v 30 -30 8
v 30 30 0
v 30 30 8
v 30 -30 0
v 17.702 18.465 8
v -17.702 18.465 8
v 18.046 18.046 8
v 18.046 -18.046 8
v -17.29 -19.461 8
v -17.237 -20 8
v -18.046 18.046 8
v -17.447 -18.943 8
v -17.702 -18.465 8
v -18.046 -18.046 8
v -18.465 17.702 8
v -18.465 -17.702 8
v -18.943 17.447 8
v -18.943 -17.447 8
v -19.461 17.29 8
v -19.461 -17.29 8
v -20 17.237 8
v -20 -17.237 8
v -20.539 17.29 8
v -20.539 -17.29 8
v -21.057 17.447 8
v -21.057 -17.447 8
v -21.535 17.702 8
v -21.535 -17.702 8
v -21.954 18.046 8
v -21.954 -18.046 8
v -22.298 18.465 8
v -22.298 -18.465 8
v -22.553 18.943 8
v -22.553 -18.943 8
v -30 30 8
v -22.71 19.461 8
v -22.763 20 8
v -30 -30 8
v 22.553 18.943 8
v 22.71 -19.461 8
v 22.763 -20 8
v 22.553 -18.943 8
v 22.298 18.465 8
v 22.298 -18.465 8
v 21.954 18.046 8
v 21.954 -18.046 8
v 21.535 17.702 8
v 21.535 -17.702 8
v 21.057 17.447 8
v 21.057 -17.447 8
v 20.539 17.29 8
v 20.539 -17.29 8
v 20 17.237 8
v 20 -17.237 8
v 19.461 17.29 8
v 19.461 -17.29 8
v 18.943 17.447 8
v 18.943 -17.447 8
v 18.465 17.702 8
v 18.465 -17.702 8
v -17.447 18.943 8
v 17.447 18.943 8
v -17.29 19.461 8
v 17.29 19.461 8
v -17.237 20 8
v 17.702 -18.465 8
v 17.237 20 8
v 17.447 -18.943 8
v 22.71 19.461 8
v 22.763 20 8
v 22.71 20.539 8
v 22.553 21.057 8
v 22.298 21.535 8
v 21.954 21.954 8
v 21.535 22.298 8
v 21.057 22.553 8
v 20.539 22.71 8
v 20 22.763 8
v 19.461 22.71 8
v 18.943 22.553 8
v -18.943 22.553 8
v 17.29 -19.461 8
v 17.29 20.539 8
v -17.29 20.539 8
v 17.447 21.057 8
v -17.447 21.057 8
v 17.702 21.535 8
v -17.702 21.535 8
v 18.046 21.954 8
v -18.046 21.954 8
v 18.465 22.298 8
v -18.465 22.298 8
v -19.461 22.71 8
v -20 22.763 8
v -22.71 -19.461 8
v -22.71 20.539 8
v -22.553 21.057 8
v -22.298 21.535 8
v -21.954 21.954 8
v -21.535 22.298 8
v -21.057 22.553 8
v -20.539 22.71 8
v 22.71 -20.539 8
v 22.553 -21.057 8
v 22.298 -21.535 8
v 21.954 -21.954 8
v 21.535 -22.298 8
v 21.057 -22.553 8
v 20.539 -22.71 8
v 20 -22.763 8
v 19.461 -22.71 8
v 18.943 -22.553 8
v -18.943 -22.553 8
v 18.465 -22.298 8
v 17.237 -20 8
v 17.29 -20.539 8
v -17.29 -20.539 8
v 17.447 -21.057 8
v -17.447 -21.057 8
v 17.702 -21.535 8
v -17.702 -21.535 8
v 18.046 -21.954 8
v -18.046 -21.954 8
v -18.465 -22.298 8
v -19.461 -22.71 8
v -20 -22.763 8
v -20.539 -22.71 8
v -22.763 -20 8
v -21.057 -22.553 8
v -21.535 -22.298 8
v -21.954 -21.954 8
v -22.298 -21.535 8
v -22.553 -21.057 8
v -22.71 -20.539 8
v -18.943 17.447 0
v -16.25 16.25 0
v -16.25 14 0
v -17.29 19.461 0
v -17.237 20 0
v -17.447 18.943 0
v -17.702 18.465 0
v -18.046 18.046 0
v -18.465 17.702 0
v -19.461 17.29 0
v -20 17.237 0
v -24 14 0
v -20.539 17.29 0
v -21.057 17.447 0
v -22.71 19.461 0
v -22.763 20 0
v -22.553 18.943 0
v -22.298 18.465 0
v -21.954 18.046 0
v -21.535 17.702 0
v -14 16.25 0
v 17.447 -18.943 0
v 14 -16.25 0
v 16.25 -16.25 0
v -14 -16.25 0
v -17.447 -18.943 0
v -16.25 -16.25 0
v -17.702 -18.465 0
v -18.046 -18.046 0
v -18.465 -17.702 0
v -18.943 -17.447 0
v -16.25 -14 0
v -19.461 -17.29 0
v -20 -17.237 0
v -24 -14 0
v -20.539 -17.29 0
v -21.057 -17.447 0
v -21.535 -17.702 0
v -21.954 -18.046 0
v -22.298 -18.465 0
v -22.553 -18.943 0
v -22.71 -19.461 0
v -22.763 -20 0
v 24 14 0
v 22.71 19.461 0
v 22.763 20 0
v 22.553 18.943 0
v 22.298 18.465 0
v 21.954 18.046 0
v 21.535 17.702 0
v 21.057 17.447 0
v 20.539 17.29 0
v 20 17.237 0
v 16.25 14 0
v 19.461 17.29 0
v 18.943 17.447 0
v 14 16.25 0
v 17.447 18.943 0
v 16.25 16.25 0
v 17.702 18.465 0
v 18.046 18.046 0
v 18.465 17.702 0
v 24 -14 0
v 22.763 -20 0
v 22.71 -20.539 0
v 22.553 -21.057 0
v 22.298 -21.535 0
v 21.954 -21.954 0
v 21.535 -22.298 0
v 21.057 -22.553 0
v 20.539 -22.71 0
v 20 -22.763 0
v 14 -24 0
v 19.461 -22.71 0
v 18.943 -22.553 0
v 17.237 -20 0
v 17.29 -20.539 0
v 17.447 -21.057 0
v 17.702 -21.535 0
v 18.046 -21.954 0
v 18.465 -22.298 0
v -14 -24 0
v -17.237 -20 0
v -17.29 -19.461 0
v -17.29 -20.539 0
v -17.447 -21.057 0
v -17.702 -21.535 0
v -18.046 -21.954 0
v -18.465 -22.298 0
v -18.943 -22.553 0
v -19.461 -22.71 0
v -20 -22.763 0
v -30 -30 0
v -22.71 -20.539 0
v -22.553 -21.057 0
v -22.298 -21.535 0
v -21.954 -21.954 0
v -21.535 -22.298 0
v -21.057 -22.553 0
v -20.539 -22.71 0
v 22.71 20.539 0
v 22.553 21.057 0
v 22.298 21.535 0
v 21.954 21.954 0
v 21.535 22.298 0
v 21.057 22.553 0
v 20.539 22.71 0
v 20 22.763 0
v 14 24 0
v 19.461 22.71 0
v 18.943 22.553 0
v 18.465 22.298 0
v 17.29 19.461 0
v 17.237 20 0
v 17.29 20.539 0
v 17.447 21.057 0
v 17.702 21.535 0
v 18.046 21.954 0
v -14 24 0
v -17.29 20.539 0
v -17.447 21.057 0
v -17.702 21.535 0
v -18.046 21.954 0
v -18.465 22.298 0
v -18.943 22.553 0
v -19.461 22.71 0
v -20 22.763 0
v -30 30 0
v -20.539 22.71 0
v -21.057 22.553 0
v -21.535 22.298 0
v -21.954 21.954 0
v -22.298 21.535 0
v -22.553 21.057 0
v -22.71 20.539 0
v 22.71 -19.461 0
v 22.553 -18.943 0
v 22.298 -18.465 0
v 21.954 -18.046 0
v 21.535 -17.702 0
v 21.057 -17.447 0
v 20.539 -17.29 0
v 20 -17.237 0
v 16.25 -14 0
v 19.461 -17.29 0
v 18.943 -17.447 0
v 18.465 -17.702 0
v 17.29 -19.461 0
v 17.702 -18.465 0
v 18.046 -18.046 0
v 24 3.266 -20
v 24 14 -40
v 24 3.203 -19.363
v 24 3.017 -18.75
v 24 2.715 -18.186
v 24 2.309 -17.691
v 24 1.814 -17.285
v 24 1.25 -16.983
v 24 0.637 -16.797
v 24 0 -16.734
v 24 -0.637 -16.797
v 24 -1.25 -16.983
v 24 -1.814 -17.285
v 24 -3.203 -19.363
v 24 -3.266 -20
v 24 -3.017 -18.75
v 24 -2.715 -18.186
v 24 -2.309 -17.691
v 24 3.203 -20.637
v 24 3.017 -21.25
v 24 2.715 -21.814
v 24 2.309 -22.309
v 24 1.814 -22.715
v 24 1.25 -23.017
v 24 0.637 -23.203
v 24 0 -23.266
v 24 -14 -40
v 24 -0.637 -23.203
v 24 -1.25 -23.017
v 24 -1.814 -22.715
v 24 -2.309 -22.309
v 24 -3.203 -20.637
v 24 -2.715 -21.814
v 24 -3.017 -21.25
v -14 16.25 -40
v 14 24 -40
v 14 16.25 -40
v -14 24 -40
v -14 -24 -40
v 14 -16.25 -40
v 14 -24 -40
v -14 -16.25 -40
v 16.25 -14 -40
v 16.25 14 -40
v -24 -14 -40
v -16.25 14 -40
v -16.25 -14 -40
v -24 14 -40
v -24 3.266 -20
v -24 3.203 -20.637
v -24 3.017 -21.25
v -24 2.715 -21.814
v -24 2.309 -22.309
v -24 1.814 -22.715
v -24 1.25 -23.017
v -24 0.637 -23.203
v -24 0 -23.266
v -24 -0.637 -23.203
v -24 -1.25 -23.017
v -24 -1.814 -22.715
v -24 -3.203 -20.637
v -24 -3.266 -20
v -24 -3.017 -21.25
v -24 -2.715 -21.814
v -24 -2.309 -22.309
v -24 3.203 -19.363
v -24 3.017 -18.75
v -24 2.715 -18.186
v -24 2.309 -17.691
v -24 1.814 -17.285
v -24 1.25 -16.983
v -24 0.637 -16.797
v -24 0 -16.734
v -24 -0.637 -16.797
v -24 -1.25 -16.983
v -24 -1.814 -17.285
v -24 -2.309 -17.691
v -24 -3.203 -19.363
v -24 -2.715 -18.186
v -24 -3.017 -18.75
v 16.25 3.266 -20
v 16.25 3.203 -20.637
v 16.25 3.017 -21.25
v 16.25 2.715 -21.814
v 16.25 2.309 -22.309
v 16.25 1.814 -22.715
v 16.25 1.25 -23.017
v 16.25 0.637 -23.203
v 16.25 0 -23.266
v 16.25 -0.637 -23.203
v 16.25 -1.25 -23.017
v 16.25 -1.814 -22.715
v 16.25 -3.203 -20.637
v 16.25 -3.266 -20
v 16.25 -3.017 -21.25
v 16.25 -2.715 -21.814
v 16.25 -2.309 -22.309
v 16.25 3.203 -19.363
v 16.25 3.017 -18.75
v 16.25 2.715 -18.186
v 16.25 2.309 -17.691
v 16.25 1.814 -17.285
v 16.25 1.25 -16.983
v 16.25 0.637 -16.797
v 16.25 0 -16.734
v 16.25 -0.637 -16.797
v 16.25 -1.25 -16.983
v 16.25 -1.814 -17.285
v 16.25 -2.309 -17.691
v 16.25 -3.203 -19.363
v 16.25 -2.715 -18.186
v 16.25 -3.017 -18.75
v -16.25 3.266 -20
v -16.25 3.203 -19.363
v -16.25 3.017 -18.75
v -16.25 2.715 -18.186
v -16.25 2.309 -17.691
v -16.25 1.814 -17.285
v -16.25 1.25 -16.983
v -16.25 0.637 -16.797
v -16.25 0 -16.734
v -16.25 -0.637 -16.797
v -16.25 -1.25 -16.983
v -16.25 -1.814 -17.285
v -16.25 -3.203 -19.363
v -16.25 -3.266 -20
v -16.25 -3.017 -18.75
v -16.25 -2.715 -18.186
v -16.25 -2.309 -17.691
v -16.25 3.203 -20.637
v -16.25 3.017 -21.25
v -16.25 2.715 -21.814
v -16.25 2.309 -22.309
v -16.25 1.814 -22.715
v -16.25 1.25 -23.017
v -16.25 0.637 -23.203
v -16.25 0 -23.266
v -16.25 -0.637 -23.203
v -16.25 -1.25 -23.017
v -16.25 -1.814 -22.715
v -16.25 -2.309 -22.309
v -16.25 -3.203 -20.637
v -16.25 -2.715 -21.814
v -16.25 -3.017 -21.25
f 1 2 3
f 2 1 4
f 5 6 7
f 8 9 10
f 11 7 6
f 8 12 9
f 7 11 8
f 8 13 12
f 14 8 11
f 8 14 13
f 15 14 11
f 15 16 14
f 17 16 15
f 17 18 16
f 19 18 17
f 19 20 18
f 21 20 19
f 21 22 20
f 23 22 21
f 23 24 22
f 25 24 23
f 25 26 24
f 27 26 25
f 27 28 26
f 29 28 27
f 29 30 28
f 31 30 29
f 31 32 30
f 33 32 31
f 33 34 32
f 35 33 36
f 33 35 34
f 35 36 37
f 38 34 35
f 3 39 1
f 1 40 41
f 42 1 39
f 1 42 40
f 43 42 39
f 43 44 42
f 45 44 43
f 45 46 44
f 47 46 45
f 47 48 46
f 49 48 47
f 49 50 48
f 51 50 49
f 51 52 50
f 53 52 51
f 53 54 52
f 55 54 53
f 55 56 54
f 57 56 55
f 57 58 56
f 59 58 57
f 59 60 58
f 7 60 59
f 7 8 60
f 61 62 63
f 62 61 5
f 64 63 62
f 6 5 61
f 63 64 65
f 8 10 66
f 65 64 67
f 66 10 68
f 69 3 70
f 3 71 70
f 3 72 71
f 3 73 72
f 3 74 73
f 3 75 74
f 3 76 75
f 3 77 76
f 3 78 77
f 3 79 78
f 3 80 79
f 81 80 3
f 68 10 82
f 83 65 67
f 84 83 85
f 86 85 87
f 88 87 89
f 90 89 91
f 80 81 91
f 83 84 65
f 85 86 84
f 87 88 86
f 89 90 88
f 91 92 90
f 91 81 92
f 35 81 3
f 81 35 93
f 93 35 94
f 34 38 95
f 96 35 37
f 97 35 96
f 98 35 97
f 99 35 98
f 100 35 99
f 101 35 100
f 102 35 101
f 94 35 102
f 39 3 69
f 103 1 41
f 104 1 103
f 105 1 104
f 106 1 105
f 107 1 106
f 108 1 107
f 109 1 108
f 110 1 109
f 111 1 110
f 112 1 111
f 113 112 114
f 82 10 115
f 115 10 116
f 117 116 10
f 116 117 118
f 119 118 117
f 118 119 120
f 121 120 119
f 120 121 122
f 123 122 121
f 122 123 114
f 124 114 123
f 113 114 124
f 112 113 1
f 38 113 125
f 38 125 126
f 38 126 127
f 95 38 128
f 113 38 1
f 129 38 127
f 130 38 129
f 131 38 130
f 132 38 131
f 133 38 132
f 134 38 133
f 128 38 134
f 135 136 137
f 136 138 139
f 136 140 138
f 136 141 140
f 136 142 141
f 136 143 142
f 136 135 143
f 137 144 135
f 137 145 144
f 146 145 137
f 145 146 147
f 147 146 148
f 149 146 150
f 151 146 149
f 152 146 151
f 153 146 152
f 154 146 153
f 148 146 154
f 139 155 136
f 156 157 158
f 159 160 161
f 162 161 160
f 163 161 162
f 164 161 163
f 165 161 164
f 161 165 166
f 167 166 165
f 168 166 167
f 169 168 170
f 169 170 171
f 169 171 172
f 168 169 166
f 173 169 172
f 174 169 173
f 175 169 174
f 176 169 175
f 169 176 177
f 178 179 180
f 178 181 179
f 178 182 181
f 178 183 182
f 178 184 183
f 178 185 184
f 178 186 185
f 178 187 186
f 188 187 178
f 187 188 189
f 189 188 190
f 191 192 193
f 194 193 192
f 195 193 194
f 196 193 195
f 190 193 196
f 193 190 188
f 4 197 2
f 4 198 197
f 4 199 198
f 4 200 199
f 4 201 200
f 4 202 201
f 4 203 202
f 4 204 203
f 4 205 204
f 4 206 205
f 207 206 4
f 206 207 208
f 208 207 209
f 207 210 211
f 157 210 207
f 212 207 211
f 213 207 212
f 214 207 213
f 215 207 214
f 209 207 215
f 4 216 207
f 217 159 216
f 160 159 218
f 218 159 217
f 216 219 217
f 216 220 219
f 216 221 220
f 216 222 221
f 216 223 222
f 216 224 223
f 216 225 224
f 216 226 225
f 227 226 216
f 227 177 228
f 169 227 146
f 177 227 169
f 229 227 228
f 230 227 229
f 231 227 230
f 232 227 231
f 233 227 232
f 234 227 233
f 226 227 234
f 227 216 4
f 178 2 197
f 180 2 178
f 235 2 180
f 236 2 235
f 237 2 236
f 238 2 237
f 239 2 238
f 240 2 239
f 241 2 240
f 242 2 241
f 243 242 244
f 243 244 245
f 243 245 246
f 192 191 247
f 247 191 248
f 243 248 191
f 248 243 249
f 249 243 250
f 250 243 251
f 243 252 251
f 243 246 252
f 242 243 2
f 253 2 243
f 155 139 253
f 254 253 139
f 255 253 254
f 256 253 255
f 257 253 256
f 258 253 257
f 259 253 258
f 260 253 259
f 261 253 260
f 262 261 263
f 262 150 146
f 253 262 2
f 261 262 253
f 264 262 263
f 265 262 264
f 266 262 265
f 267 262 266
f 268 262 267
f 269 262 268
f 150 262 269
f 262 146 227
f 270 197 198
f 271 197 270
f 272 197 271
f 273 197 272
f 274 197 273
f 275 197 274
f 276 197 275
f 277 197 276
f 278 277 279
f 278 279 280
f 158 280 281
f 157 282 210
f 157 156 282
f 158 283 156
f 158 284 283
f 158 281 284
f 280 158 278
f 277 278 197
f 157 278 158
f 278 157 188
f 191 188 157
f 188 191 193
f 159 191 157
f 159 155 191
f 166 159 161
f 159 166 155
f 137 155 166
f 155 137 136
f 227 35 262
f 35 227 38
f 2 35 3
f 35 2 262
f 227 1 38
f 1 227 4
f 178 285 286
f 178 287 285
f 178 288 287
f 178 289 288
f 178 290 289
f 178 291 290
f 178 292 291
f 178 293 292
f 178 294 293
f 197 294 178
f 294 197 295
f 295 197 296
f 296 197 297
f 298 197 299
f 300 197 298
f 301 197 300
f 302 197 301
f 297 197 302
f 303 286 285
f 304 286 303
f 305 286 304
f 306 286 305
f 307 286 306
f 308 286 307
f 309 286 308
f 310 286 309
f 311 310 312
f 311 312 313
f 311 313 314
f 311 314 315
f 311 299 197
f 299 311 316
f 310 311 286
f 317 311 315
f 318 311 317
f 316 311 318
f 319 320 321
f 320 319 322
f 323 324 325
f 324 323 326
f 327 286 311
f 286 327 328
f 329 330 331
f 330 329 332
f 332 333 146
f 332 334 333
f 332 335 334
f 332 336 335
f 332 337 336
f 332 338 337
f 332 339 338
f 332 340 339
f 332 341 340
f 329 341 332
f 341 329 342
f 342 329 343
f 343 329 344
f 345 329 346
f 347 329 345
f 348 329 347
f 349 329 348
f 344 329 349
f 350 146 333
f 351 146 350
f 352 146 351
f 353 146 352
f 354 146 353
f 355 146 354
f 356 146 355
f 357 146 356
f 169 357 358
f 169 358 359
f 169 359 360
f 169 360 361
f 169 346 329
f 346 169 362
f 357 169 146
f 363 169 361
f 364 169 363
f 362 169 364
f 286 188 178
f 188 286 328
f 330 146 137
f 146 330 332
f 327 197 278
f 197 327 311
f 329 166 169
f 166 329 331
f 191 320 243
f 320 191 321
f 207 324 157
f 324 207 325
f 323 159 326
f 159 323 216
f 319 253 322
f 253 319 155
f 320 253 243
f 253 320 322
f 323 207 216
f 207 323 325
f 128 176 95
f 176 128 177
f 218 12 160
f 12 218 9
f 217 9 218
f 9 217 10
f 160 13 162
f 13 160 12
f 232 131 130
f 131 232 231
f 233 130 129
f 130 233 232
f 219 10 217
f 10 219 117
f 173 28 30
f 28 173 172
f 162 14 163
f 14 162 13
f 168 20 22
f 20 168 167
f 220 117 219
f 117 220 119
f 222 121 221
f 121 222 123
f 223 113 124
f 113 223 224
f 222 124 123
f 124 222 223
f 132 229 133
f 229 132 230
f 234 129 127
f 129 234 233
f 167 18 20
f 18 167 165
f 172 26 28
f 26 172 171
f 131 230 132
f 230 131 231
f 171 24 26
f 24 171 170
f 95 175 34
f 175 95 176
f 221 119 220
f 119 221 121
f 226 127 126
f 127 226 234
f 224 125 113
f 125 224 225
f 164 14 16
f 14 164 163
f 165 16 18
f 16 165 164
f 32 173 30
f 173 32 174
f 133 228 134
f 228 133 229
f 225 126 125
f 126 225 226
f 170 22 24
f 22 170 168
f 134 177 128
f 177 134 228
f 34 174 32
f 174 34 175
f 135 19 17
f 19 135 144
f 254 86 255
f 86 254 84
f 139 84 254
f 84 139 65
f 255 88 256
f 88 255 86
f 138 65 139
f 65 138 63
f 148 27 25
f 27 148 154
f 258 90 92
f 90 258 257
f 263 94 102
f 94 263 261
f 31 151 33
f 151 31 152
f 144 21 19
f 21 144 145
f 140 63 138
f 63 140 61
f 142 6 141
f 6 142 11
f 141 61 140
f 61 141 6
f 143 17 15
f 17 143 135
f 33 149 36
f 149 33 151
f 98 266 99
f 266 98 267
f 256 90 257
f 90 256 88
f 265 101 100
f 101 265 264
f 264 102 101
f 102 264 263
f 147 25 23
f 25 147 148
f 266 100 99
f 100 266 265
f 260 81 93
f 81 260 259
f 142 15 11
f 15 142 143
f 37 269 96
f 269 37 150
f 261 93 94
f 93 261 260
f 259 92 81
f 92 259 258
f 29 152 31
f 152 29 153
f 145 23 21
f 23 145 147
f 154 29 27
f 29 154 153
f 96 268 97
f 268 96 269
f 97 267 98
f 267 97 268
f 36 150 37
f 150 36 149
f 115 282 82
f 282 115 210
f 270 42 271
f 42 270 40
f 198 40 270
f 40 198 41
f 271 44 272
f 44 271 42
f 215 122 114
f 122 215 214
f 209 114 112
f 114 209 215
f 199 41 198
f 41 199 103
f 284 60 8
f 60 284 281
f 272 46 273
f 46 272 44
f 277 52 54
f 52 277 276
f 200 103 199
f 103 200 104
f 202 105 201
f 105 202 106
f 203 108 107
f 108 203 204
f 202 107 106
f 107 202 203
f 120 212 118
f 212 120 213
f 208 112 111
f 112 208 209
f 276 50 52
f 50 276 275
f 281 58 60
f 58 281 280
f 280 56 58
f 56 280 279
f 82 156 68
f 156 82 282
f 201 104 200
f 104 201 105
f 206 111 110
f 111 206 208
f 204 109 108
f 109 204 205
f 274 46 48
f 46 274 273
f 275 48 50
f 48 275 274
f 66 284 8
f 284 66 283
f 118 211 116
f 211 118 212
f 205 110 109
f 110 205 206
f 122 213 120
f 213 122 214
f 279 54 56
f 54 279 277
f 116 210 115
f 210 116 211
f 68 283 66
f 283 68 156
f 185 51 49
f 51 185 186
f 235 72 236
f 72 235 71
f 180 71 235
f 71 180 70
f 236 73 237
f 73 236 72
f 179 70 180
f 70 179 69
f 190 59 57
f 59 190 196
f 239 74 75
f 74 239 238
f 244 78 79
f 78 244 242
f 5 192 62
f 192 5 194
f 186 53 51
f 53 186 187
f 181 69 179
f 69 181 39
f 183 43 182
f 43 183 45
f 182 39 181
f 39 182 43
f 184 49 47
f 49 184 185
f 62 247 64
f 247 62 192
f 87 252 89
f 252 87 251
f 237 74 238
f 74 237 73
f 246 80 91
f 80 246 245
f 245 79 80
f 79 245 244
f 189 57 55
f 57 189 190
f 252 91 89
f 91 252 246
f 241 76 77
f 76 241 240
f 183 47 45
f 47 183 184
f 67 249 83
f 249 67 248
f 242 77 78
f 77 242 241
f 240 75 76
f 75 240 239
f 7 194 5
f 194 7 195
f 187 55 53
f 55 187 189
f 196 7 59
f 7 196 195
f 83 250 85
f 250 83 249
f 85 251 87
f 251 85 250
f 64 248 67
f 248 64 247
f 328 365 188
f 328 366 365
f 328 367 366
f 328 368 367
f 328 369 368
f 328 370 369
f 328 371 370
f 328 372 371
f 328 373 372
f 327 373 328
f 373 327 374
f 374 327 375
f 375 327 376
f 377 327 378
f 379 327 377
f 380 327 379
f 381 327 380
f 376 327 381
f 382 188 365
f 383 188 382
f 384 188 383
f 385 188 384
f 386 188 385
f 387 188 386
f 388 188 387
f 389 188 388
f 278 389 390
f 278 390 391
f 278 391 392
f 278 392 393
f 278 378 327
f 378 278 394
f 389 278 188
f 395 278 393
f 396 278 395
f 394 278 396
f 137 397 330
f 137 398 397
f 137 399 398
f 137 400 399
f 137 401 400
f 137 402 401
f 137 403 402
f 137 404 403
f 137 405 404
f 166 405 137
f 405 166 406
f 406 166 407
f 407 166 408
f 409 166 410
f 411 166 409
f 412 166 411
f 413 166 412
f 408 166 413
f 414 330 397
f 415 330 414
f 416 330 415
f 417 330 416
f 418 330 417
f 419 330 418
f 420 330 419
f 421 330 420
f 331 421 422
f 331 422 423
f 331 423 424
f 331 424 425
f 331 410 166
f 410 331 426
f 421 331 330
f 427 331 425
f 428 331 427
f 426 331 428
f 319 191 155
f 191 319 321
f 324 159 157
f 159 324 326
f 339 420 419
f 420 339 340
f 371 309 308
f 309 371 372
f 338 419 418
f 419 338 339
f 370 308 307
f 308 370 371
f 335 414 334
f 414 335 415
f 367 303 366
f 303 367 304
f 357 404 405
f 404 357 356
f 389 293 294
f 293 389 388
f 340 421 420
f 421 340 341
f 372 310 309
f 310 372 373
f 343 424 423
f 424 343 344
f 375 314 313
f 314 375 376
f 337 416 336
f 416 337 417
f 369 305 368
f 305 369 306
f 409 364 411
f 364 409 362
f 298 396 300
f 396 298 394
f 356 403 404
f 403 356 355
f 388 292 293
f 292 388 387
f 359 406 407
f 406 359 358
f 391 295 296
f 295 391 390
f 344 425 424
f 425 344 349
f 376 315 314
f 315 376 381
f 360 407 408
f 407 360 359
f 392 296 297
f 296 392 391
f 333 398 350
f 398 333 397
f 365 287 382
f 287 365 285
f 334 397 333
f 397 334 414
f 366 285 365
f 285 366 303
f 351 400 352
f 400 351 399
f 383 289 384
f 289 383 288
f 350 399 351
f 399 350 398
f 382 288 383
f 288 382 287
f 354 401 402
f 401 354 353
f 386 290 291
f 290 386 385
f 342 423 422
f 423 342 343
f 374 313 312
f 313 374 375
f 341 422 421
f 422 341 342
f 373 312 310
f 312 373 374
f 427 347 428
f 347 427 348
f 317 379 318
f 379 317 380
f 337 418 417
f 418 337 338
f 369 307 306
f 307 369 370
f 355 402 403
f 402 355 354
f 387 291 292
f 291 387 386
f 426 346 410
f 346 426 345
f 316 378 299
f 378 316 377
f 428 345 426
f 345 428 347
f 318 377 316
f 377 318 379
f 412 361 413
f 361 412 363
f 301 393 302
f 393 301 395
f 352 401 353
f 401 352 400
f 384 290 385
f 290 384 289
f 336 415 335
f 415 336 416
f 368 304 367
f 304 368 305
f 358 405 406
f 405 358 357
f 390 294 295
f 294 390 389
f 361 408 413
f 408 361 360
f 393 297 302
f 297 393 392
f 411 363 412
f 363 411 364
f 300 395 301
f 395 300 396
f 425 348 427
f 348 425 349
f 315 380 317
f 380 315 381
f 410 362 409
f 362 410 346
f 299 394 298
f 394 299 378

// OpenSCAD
// Central HP40 deck to 32 mm printed keel. No connection to floats.
part="assembly"; // [assembly,print]
plate_w=60; plate_t=8; socket_w=48; arm_half=14;
socket_h=40; beam_w=32; fit=0.5; hp=40; pin_z=-20;
$fn=64;e=0.03;
assert(hp/2-5.5>arm_half,"Driver/washer access intersects socket arm");
assert(socket_w/2-(beam_w+fit)/2>=6);
module hole(d,h){cylinder(d=d/cos(180/32),h=h,$fn=32);}
module body(){difference(){
 union(){
  translate([-plate_w/2,-plate_w/2,0])cube([plate_w,plate_w,plate_t]);
  translate([-socket_w/2,-arm_half,-socket_h])cube([socket_w,2*arm_half,socket_h+e]);
  translate([-arm_half,-socket_w/2,-socket_h])cube([2*arm_half,socket_w,socket_h+e]);
 }
 translate([-(beam_w+fit)/2,-(beam_w+fit)/2,-socket_h-e])cube([beam_w+fit,beam_w+fit,socket_h+e]);
 for(x=[-hp/2,hp/2],y=[-hp/2,hp/2])translate([x,y,-e])hole(5.5,plate_t+2*e);
 translate([-socket_w/2-e,0,pin_z])rotate([0,90,0])hole(6.5,socket_w+2*e);
}}
if(part=="print")translate([0,0,plate_t])rotate([180,0,0])body();else body();
